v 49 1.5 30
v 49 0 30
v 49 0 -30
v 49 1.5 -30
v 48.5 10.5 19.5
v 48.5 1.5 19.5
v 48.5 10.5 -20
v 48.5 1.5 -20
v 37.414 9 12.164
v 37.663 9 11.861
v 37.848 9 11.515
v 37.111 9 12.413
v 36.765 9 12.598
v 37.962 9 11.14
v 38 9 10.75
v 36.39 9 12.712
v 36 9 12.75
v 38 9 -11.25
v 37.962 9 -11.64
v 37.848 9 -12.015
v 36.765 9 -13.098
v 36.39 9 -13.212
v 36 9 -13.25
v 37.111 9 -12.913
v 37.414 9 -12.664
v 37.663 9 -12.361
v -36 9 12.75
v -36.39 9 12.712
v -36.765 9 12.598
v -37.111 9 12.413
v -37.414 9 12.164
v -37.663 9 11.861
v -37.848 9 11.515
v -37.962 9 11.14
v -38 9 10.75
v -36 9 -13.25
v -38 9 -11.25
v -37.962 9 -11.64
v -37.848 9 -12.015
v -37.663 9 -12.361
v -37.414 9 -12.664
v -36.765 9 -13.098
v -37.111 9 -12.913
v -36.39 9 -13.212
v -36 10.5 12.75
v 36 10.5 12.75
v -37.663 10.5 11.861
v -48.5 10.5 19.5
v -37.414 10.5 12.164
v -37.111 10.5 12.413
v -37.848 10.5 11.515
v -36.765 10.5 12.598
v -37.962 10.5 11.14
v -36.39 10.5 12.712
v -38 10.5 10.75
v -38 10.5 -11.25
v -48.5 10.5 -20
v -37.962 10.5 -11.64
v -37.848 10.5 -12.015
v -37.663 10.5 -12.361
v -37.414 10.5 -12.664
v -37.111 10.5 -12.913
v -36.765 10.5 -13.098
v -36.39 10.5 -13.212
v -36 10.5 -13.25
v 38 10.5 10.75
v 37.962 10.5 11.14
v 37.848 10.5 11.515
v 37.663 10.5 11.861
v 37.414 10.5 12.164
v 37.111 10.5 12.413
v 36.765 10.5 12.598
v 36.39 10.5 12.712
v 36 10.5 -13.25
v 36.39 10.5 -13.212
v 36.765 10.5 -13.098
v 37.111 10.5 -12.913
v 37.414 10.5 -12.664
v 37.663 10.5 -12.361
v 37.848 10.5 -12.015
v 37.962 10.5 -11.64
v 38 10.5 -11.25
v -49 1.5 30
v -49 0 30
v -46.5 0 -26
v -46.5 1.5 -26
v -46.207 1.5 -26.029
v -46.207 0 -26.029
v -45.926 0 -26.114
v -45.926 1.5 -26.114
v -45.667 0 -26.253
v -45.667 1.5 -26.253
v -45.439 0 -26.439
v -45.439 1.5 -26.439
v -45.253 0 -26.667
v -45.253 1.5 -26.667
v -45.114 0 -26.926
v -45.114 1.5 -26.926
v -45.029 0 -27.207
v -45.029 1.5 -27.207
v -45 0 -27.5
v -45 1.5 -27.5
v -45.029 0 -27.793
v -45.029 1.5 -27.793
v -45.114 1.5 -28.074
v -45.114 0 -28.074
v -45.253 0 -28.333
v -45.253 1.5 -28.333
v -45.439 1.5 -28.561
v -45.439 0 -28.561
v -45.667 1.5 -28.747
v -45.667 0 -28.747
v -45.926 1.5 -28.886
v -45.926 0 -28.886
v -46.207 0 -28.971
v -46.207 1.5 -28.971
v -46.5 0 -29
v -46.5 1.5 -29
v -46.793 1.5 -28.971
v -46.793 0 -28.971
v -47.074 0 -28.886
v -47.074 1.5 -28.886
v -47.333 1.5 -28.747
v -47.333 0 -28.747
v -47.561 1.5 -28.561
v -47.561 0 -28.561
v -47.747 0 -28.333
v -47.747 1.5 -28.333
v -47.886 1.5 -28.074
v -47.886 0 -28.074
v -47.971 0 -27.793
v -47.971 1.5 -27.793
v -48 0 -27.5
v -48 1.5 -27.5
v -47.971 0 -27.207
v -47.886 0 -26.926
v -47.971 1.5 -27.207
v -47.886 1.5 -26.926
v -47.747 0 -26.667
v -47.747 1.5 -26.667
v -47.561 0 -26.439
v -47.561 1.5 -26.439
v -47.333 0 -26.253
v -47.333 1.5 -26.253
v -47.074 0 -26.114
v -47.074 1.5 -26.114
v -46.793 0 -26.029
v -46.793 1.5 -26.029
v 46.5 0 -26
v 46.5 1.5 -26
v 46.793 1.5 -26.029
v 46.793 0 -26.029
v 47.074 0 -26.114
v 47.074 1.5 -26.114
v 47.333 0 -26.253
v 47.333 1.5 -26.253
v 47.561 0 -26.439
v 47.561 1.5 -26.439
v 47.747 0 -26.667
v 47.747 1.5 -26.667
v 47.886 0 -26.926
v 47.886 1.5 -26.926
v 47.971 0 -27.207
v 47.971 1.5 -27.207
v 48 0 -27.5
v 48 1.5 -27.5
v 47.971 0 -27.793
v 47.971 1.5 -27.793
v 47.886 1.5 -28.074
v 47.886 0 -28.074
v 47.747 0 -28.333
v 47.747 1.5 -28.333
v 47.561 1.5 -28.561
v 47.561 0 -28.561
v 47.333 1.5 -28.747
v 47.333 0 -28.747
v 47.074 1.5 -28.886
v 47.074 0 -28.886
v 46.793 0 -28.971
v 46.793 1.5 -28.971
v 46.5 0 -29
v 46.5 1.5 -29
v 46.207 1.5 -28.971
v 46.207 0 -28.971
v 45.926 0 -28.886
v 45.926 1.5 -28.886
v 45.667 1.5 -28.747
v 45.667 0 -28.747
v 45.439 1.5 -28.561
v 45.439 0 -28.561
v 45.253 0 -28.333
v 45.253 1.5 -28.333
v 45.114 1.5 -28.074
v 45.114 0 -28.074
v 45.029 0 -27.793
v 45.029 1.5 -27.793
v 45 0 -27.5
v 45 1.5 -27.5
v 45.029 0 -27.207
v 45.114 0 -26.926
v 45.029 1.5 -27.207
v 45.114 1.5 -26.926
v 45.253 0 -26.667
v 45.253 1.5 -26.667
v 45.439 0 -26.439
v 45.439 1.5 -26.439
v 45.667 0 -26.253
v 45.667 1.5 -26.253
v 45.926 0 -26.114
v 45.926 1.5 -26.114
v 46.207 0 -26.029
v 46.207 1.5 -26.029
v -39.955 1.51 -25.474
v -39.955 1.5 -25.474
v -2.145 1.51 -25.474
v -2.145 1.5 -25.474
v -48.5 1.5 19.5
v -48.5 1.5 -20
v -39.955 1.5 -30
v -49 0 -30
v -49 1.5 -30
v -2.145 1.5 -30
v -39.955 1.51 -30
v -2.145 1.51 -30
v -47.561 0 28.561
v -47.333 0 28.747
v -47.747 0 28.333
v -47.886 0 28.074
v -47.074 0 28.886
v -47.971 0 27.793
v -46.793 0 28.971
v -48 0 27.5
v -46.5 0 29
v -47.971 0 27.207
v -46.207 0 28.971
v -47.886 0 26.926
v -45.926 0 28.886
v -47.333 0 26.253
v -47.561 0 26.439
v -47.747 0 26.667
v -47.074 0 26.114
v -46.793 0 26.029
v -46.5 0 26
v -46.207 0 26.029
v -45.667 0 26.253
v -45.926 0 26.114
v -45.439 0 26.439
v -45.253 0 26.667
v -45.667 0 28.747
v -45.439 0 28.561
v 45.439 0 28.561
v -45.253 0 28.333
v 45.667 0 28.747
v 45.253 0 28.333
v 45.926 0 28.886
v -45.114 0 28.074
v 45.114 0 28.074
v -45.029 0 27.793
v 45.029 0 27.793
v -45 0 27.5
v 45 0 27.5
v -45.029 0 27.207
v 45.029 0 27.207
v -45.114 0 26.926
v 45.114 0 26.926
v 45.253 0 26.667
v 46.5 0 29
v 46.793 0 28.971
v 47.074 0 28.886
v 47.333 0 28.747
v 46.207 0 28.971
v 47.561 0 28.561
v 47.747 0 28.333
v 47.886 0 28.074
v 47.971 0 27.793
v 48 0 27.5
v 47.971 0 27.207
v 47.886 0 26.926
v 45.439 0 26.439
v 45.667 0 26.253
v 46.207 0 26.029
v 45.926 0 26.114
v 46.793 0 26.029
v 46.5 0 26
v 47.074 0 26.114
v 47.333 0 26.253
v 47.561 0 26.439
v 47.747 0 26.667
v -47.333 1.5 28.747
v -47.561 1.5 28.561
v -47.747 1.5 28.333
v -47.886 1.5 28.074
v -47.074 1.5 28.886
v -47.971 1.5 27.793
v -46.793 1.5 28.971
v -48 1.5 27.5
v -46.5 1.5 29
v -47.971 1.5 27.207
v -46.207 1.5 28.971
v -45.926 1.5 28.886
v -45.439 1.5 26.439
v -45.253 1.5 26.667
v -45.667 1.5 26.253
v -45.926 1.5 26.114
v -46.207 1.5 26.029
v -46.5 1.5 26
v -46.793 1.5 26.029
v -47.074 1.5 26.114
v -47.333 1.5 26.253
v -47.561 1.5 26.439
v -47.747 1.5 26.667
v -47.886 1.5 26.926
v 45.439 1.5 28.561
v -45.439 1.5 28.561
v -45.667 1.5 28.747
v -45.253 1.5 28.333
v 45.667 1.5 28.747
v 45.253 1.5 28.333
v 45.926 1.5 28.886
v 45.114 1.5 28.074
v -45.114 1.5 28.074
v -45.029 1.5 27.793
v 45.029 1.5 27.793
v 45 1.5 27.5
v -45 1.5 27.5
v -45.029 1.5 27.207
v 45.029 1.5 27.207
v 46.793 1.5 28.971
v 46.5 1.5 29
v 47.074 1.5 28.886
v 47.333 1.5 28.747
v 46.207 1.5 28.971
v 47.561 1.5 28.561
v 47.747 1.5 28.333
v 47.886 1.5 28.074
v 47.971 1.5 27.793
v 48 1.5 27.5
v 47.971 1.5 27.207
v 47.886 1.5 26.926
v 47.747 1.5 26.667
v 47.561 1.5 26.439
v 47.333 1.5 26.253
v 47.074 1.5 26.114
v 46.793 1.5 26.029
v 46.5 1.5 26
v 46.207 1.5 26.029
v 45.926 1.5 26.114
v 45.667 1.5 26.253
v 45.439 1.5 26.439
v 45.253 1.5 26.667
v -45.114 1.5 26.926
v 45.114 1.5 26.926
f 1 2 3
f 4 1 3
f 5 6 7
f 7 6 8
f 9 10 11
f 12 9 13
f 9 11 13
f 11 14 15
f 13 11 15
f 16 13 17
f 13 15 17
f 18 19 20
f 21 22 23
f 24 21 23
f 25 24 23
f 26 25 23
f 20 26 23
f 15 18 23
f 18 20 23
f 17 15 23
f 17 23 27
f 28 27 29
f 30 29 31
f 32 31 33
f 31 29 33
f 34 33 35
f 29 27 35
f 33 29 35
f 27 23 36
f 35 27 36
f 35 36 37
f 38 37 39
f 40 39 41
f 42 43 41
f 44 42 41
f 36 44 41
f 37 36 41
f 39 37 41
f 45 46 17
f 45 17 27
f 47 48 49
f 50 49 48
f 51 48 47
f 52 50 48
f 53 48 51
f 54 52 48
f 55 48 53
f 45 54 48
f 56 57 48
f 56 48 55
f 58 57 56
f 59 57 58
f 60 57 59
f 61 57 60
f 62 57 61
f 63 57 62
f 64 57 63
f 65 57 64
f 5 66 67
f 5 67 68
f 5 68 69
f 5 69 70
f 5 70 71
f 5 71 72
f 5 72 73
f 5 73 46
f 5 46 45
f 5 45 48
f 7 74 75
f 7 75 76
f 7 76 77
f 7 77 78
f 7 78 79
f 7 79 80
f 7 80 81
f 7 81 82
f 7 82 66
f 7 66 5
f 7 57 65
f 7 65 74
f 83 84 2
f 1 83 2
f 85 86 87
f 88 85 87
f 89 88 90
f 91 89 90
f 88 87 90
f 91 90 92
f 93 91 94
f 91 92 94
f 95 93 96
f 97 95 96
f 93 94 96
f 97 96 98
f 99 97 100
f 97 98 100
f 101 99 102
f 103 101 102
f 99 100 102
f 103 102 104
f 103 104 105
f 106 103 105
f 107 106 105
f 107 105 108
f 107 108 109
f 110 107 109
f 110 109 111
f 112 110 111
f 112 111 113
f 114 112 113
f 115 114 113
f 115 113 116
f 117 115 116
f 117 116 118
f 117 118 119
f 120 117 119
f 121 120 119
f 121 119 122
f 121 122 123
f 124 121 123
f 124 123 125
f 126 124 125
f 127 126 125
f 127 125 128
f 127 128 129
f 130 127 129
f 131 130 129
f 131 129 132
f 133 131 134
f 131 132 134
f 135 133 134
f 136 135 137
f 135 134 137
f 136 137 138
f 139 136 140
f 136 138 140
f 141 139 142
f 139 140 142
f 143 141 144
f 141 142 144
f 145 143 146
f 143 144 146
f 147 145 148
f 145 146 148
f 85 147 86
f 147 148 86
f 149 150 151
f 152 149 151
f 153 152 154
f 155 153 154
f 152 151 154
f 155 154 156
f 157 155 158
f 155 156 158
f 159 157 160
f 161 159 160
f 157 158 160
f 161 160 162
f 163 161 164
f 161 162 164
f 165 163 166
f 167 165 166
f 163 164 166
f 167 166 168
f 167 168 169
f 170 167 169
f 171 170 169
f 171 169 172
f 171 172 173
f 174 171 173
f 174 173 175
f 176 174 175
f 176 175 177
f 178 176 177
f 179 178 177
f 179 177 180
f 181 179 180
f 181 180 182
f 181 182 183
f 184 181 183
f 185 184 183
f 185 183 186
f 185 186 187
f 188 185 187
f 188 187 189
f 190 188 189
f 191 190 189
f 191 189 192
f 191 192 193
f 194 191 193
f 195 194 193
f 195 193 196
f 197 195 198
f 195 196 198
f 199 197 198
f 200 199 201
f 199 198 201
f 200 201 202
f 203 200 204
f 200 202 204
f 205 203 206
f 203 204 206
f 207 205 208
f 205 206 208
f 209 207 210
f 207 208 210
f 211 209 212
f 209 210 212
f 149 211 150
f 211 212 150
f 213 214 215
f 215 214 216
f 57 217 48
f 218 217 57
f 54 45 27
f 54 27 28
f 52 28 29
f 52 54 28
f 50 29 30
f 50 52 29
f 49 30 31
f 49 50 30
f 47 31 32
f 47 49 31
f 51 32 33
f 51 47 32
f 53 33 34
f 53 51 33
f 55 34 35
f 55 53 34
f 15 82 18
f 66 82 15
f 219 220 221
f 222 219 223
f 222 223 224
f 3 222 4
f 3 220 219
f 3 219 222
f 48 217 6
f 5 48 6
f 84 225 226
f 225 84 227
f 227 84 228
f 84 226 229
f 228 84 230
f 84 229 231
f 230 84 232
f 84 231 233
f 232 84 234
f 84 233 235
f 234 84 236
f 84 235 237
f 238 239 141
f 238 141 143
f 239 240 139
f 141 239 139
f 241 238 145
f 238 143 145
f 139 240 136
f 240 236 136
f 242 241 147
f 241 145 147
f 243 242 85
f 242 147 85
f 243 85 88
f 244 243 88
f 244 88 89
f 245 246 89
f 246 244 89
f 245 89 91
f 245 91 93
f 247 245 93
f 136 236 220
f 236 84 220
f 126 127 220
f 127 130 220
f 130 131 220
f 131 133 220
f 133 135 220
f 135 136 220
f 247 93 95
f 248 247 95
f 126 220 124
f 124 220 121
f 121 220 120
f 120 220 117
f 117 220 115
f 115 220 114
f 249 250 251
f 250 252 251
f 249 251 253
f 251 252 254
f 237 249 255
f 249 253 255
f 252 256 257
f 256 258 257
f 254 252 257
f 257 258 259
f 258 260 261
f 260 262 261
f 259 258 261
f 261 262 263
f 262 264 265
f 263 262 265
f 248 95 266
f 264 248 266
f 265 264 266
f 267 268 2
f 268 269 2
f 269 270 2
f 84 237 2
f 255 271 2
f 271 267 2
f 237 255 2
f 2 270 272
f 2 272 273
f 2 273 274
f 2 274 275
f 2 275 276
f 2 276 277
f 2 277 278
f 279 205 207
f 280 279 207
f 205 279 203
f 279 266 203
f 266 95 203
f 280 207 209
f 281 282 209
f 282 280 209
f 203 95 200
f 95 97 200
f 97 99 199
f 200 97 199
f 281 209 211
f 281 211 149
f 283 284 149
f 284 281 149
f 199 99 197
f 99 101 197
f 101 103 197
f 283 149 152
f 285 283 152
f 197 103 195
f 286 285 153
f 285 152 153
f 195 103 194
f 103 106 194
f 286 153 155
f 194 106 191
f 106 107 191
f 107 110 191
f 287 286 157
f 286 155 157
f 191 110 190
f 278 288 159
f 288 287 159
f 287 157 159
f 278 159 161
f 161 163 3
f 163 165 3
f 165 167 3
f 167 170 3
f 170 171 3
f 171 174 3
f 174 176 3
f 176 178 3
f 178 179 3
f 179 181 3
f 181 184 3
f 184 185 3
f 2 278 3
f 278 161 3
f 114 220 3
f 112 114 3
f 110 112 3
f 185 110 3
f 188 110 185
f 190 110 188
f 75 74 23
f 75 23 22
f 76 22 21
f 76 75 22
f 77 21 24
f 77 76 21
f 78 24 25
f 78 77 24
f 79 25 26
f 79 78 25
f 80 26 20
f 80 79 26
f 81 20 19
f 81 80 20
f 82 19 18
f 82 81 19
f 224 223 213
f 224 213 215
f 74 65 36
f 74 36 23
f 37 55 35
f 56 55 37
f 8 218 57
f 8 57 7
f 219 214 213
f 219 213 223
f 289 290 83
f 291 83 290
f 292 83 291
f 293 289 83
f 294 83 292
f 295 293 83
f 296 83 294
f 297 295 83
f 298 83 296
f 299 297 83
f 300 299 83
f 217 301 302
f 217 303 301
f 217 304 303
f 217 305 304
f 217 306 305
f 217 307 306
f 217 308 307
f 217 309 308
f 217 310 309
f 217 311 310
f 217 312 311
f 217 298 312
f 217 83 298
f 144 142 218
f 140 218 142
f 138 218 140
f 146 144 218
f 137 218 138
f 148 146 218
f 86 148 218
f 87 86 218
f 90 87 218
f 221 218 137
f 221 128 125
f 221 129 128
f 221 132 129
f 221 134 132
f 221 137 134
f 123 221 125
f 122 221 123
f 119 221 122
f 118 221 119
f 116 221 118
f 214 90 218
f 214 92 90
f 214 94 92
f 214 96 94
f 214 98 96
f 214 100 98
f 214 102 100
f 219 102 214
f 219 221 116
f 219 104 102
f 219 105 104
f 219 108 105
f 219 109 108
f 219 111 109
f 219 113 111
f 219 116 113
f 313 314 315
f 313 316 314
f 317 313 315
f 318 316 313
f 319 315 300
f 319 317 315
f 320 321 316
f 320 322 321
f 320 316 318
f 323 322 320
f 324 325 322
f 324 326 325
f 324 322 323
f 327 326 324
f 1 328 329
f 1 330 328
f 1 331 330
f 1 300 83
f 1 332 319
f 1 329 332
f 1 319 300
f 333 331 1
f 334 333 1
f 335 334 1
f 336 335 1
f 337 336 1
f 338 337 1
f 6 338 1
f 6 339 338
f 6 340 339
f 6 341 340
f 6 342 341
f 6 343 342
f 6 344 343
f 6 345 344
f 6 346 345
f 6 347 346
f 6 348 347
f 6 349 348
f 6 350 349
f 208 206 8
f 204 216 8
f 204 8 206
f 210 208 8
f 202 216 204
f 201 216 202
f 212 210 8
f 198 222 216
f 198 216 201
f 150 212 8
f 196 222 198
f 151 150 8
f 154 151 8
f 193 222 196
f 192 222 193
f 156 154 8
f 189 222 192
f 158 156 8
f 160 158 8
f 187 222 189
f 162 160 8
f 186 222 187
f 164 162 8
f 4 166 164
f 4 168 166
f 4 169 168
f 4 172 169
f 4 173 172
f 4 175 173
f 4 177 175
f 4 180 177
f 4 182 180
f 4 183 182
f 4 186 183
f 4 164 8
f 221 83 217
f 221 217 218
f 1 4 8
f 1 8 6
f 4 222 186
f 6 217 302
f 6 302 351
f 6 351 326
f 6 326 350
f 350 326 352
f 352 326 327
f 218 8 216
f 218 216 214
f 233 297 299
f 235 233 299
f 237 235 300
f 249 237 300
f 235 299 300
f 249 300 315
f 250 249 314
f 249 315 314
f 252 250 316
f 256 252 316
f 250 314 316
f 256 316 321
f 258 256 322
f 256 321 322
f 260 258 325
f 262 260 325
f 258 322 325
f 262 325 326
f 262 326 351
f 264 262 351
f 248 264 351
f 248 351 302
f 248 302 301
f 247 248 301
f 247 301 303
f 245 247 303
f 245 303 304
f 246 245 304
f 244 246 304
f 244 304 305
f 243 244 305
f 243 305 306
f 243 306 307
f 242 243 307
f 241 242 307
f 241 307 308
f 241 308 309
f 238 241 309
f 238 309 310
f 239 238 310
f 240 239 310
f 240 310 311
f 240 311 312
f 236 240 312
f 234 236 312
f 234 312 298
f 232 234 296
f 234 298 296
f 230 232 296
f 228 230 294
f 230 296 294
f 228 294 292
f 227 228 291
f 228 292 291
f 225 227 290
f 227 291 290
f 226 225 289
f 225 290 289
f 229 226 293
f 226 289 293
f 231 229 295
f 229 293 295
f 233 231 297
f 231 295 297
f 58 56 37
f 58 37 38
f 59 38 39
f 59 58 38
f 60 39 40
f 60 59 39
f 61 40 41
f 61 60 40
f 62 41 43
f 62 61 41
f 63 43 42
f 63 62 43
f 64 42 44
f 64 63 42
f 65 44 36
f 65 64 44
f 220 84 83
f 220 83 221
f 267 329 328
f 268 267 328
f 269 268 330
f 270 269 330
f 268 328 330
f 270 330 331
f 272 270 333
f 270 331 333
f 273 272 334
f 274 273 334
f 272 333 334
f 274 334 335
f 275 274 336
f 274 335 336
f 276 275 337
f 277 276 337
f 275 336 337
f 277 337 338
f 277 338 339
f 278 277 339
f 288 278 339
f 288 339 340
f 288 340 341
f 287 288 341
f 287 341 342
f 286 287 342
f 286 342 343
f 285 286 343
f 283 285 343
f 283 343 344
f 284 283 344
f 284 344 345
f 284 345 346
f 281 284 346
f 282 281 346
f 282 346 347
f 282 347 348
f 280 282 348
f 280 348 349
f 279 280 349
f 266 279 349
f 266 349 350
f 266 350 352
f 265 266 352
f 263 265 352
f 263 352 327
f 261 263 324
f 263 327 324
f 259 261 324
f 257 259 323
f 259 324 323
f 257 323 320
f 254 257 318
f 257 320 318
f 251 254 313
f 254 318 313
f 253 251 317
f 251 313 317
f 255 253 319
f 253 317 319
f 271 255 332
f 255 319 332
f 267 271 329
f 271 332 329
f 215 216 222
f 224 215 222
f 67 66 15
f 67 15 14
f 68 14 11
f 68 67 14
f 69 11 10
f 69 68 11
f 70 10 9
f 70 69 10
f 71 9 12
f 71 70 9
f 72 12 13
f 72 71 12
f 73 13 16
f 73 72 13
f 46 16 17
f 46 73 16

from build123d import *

# Parameters (mm, degrees)
SKETCH1_W           = 98
SKETCH1_H           = 60
BOSS_EXTRUDE1_DEPTH = 1.5
SKETCH2_W           = 97
SKETCH2_H           = 39.5
BOSS_EXTRUDE2_DEPTH = 9
CUT_EXTRUDE1_DEPTH  = 1.5
CUT_EXTRUDE2_REACH  = 60.155
SKETCH4_R           = 1.5
SKETCH5_W           = 37.809406893
SKETCH5_H           = 4.525576916
BOSS_EXTRUDE3_DEPTH = 0.01


with BuildPart() as part:
    # Sketch1 → Boss-Extrude1 (new body)
    with BuildSketch(Plane(origin=(0, 0, 0), x_dir=(1, 0, 0), z_dir=(0, 1, 0))):
        Rectangle(SKETCH1_W, SKETCH1_H)
    extrude(amount=BOSS_EXTRUDE1_DEPTH)

    # Sketch2 → Boss-Extrude2 (add)
    with BuildSketch(Plane(origin=(0, 1.5, 0), x_dir=(1, 0, 0), z_dir=(0, 1, 0))):
        with Locations((0, 0.25)):
            Rectangle(SKETCH2_W, SKETCH2_H)
    extrude(amount=BOSS_EXTRUDE2_DEPTH)

    # Sketch3 → Cut-Extrude1 (cut)
    with BuildSketch(Plane(origin=(0, 10.5, 0), x_dir=(1, 0, 0), z_dir=(0, 1, 0))):
        with BuildLine():
            Line((-36, 13.25), (36, 13.25))
            ThreePointArc((36, 13.25), (37.414213562, 12.664213562), (38, 11.25))
            Line((38, 11.25), (38, -10.75))
            ThreePointArc((38, -10.75), (37.414213562, -12.164213562), (36, -12.75))
            Line((36, -12.75), (-36, -12.75))
            ThreePointArc((-36, -12.75), (-37.414213562, -12.164213562), (-38, -10.75))
            Line((-38, -10.75), (-38, 11.25))
            ThreePointArc((-38, 11.25), (-37.414213562, 12.664213562), (-36, 13.25))
        make_face()
    extrude(amount=-CUT_EXTRUDE1_DEPTH, mode=Mode.SUBTRACT)

    # Sketch4 → Cut-Extrude2 (cut, up to next)
    with BuildSketch(Plane(origin=(0, 1.5, 0), x_dir=(1, 0, 0), z_dir=(0, 1, 0)), mode=Mode.PRIVATE) as cut_extrude2_sk1:
        with Locations(Location((-46.5, 27.5, 0), (0, 0, 270))):
            Circle(SKETCH4_R)
    cut_extrude2_tool1 = extrude(cut_extrude2_sk1.sketch, amount=-CUT_EXTRUDE2_REACH, mode=Mode.PRIVATE) & part.part
    # Sketch4 → Cut-Extrude2 (cut, up to next)
    with BuildSketch(Plane(origin=(0, 1.5, 0), x_dir=(1, 0, 0), z_dir=(0, 1, 0)), mode=Mode.PRIVATE) as cut_extrude2_sk2:
        with Locations(Location((46.5, 27.5, 0), (0, 0, 270))):
            Circle(SKETCH4_R)
    cut_extrude2_tool2 = extrude(cut_extrude2_sk2.sketch, amount=-CUT_EXTRUDE2_REACH, mode=Mode.PRIVATE) & part.part
    # Sketch4 → Cut-Extrude2 (cut, up to next)
    with BuildSketch(Plane(origin=(0, 1.5, 0), x_dir=(1, 0, 0), z_dir=(0, 1, 0)), mode=Mode.PRIVATE) as cut_extrude2_sk3:
        with Locations(Location((46.5, -27.5, 0), (0, 0, 270))):
            Circle(SKETCH4_R)
    cut_extrude2_tool3 = extrude(cut_extrude2_sk3.sketch, amount=-CUT_EXTRUDE2_REACH, mode=Mode.PRIVATE) & part.part
    # Sketch4 → Cut-Extrude2 (cut, up to next)
    with BuildSketch(Plane(origin=(0, 1.5, 0), x_dir=(1, 0, 0), z_dir=(0, 1, 0)), mode=Mode.PRIVATE) as cut_extrude2_sk4:
        with Locations(Location((-46.5, -27.5, 0), (0, 0, 270))):
            Circle(SKETCH4_R)
    cut_extrude2_tool4 = extrude(cut_extrude2_sk4.sketch, amount=-CUT_EXTRUDE2_REACH, mode=Mode.PRIVATE) & part.part
    add(cut_extrude2_tool1.solids().sort_by_distance((-46.5, 1.5, -27.5))[0], mode=Mode.SUBTRACT)
    add(cut_extrude2_tool2.solids().sort_by_distance((46.5, 1.5, -27.5))[0], mode=Mode.SUBTRACT)
    add(cut_extrude2_tool3.solids().sort_by_distance((46.5, 1.5, 27.5))[0], mode=Mode.SUBTRACT)
    add(cut_extrude2_tool4.solids().sort_by_distance((-46.5, 1.5, 27.5))[0], mode=Mode.SUBTRACT)

    # Sketch5 → Boss-Extrude3 (add)
    with BuildSketch(Plane(origin=(0, 1.5, 0), x_dir=(1, 0, 0), z_dir=(0, 1, 0))):
        with Locations((-21.049918021, 27.737211542)):
            Rectangle(SKETCH5_W, SKETCH5_H)
    extrude(amount=BOSS_EXTRUDE3_DEPTH)


solid = part.part
